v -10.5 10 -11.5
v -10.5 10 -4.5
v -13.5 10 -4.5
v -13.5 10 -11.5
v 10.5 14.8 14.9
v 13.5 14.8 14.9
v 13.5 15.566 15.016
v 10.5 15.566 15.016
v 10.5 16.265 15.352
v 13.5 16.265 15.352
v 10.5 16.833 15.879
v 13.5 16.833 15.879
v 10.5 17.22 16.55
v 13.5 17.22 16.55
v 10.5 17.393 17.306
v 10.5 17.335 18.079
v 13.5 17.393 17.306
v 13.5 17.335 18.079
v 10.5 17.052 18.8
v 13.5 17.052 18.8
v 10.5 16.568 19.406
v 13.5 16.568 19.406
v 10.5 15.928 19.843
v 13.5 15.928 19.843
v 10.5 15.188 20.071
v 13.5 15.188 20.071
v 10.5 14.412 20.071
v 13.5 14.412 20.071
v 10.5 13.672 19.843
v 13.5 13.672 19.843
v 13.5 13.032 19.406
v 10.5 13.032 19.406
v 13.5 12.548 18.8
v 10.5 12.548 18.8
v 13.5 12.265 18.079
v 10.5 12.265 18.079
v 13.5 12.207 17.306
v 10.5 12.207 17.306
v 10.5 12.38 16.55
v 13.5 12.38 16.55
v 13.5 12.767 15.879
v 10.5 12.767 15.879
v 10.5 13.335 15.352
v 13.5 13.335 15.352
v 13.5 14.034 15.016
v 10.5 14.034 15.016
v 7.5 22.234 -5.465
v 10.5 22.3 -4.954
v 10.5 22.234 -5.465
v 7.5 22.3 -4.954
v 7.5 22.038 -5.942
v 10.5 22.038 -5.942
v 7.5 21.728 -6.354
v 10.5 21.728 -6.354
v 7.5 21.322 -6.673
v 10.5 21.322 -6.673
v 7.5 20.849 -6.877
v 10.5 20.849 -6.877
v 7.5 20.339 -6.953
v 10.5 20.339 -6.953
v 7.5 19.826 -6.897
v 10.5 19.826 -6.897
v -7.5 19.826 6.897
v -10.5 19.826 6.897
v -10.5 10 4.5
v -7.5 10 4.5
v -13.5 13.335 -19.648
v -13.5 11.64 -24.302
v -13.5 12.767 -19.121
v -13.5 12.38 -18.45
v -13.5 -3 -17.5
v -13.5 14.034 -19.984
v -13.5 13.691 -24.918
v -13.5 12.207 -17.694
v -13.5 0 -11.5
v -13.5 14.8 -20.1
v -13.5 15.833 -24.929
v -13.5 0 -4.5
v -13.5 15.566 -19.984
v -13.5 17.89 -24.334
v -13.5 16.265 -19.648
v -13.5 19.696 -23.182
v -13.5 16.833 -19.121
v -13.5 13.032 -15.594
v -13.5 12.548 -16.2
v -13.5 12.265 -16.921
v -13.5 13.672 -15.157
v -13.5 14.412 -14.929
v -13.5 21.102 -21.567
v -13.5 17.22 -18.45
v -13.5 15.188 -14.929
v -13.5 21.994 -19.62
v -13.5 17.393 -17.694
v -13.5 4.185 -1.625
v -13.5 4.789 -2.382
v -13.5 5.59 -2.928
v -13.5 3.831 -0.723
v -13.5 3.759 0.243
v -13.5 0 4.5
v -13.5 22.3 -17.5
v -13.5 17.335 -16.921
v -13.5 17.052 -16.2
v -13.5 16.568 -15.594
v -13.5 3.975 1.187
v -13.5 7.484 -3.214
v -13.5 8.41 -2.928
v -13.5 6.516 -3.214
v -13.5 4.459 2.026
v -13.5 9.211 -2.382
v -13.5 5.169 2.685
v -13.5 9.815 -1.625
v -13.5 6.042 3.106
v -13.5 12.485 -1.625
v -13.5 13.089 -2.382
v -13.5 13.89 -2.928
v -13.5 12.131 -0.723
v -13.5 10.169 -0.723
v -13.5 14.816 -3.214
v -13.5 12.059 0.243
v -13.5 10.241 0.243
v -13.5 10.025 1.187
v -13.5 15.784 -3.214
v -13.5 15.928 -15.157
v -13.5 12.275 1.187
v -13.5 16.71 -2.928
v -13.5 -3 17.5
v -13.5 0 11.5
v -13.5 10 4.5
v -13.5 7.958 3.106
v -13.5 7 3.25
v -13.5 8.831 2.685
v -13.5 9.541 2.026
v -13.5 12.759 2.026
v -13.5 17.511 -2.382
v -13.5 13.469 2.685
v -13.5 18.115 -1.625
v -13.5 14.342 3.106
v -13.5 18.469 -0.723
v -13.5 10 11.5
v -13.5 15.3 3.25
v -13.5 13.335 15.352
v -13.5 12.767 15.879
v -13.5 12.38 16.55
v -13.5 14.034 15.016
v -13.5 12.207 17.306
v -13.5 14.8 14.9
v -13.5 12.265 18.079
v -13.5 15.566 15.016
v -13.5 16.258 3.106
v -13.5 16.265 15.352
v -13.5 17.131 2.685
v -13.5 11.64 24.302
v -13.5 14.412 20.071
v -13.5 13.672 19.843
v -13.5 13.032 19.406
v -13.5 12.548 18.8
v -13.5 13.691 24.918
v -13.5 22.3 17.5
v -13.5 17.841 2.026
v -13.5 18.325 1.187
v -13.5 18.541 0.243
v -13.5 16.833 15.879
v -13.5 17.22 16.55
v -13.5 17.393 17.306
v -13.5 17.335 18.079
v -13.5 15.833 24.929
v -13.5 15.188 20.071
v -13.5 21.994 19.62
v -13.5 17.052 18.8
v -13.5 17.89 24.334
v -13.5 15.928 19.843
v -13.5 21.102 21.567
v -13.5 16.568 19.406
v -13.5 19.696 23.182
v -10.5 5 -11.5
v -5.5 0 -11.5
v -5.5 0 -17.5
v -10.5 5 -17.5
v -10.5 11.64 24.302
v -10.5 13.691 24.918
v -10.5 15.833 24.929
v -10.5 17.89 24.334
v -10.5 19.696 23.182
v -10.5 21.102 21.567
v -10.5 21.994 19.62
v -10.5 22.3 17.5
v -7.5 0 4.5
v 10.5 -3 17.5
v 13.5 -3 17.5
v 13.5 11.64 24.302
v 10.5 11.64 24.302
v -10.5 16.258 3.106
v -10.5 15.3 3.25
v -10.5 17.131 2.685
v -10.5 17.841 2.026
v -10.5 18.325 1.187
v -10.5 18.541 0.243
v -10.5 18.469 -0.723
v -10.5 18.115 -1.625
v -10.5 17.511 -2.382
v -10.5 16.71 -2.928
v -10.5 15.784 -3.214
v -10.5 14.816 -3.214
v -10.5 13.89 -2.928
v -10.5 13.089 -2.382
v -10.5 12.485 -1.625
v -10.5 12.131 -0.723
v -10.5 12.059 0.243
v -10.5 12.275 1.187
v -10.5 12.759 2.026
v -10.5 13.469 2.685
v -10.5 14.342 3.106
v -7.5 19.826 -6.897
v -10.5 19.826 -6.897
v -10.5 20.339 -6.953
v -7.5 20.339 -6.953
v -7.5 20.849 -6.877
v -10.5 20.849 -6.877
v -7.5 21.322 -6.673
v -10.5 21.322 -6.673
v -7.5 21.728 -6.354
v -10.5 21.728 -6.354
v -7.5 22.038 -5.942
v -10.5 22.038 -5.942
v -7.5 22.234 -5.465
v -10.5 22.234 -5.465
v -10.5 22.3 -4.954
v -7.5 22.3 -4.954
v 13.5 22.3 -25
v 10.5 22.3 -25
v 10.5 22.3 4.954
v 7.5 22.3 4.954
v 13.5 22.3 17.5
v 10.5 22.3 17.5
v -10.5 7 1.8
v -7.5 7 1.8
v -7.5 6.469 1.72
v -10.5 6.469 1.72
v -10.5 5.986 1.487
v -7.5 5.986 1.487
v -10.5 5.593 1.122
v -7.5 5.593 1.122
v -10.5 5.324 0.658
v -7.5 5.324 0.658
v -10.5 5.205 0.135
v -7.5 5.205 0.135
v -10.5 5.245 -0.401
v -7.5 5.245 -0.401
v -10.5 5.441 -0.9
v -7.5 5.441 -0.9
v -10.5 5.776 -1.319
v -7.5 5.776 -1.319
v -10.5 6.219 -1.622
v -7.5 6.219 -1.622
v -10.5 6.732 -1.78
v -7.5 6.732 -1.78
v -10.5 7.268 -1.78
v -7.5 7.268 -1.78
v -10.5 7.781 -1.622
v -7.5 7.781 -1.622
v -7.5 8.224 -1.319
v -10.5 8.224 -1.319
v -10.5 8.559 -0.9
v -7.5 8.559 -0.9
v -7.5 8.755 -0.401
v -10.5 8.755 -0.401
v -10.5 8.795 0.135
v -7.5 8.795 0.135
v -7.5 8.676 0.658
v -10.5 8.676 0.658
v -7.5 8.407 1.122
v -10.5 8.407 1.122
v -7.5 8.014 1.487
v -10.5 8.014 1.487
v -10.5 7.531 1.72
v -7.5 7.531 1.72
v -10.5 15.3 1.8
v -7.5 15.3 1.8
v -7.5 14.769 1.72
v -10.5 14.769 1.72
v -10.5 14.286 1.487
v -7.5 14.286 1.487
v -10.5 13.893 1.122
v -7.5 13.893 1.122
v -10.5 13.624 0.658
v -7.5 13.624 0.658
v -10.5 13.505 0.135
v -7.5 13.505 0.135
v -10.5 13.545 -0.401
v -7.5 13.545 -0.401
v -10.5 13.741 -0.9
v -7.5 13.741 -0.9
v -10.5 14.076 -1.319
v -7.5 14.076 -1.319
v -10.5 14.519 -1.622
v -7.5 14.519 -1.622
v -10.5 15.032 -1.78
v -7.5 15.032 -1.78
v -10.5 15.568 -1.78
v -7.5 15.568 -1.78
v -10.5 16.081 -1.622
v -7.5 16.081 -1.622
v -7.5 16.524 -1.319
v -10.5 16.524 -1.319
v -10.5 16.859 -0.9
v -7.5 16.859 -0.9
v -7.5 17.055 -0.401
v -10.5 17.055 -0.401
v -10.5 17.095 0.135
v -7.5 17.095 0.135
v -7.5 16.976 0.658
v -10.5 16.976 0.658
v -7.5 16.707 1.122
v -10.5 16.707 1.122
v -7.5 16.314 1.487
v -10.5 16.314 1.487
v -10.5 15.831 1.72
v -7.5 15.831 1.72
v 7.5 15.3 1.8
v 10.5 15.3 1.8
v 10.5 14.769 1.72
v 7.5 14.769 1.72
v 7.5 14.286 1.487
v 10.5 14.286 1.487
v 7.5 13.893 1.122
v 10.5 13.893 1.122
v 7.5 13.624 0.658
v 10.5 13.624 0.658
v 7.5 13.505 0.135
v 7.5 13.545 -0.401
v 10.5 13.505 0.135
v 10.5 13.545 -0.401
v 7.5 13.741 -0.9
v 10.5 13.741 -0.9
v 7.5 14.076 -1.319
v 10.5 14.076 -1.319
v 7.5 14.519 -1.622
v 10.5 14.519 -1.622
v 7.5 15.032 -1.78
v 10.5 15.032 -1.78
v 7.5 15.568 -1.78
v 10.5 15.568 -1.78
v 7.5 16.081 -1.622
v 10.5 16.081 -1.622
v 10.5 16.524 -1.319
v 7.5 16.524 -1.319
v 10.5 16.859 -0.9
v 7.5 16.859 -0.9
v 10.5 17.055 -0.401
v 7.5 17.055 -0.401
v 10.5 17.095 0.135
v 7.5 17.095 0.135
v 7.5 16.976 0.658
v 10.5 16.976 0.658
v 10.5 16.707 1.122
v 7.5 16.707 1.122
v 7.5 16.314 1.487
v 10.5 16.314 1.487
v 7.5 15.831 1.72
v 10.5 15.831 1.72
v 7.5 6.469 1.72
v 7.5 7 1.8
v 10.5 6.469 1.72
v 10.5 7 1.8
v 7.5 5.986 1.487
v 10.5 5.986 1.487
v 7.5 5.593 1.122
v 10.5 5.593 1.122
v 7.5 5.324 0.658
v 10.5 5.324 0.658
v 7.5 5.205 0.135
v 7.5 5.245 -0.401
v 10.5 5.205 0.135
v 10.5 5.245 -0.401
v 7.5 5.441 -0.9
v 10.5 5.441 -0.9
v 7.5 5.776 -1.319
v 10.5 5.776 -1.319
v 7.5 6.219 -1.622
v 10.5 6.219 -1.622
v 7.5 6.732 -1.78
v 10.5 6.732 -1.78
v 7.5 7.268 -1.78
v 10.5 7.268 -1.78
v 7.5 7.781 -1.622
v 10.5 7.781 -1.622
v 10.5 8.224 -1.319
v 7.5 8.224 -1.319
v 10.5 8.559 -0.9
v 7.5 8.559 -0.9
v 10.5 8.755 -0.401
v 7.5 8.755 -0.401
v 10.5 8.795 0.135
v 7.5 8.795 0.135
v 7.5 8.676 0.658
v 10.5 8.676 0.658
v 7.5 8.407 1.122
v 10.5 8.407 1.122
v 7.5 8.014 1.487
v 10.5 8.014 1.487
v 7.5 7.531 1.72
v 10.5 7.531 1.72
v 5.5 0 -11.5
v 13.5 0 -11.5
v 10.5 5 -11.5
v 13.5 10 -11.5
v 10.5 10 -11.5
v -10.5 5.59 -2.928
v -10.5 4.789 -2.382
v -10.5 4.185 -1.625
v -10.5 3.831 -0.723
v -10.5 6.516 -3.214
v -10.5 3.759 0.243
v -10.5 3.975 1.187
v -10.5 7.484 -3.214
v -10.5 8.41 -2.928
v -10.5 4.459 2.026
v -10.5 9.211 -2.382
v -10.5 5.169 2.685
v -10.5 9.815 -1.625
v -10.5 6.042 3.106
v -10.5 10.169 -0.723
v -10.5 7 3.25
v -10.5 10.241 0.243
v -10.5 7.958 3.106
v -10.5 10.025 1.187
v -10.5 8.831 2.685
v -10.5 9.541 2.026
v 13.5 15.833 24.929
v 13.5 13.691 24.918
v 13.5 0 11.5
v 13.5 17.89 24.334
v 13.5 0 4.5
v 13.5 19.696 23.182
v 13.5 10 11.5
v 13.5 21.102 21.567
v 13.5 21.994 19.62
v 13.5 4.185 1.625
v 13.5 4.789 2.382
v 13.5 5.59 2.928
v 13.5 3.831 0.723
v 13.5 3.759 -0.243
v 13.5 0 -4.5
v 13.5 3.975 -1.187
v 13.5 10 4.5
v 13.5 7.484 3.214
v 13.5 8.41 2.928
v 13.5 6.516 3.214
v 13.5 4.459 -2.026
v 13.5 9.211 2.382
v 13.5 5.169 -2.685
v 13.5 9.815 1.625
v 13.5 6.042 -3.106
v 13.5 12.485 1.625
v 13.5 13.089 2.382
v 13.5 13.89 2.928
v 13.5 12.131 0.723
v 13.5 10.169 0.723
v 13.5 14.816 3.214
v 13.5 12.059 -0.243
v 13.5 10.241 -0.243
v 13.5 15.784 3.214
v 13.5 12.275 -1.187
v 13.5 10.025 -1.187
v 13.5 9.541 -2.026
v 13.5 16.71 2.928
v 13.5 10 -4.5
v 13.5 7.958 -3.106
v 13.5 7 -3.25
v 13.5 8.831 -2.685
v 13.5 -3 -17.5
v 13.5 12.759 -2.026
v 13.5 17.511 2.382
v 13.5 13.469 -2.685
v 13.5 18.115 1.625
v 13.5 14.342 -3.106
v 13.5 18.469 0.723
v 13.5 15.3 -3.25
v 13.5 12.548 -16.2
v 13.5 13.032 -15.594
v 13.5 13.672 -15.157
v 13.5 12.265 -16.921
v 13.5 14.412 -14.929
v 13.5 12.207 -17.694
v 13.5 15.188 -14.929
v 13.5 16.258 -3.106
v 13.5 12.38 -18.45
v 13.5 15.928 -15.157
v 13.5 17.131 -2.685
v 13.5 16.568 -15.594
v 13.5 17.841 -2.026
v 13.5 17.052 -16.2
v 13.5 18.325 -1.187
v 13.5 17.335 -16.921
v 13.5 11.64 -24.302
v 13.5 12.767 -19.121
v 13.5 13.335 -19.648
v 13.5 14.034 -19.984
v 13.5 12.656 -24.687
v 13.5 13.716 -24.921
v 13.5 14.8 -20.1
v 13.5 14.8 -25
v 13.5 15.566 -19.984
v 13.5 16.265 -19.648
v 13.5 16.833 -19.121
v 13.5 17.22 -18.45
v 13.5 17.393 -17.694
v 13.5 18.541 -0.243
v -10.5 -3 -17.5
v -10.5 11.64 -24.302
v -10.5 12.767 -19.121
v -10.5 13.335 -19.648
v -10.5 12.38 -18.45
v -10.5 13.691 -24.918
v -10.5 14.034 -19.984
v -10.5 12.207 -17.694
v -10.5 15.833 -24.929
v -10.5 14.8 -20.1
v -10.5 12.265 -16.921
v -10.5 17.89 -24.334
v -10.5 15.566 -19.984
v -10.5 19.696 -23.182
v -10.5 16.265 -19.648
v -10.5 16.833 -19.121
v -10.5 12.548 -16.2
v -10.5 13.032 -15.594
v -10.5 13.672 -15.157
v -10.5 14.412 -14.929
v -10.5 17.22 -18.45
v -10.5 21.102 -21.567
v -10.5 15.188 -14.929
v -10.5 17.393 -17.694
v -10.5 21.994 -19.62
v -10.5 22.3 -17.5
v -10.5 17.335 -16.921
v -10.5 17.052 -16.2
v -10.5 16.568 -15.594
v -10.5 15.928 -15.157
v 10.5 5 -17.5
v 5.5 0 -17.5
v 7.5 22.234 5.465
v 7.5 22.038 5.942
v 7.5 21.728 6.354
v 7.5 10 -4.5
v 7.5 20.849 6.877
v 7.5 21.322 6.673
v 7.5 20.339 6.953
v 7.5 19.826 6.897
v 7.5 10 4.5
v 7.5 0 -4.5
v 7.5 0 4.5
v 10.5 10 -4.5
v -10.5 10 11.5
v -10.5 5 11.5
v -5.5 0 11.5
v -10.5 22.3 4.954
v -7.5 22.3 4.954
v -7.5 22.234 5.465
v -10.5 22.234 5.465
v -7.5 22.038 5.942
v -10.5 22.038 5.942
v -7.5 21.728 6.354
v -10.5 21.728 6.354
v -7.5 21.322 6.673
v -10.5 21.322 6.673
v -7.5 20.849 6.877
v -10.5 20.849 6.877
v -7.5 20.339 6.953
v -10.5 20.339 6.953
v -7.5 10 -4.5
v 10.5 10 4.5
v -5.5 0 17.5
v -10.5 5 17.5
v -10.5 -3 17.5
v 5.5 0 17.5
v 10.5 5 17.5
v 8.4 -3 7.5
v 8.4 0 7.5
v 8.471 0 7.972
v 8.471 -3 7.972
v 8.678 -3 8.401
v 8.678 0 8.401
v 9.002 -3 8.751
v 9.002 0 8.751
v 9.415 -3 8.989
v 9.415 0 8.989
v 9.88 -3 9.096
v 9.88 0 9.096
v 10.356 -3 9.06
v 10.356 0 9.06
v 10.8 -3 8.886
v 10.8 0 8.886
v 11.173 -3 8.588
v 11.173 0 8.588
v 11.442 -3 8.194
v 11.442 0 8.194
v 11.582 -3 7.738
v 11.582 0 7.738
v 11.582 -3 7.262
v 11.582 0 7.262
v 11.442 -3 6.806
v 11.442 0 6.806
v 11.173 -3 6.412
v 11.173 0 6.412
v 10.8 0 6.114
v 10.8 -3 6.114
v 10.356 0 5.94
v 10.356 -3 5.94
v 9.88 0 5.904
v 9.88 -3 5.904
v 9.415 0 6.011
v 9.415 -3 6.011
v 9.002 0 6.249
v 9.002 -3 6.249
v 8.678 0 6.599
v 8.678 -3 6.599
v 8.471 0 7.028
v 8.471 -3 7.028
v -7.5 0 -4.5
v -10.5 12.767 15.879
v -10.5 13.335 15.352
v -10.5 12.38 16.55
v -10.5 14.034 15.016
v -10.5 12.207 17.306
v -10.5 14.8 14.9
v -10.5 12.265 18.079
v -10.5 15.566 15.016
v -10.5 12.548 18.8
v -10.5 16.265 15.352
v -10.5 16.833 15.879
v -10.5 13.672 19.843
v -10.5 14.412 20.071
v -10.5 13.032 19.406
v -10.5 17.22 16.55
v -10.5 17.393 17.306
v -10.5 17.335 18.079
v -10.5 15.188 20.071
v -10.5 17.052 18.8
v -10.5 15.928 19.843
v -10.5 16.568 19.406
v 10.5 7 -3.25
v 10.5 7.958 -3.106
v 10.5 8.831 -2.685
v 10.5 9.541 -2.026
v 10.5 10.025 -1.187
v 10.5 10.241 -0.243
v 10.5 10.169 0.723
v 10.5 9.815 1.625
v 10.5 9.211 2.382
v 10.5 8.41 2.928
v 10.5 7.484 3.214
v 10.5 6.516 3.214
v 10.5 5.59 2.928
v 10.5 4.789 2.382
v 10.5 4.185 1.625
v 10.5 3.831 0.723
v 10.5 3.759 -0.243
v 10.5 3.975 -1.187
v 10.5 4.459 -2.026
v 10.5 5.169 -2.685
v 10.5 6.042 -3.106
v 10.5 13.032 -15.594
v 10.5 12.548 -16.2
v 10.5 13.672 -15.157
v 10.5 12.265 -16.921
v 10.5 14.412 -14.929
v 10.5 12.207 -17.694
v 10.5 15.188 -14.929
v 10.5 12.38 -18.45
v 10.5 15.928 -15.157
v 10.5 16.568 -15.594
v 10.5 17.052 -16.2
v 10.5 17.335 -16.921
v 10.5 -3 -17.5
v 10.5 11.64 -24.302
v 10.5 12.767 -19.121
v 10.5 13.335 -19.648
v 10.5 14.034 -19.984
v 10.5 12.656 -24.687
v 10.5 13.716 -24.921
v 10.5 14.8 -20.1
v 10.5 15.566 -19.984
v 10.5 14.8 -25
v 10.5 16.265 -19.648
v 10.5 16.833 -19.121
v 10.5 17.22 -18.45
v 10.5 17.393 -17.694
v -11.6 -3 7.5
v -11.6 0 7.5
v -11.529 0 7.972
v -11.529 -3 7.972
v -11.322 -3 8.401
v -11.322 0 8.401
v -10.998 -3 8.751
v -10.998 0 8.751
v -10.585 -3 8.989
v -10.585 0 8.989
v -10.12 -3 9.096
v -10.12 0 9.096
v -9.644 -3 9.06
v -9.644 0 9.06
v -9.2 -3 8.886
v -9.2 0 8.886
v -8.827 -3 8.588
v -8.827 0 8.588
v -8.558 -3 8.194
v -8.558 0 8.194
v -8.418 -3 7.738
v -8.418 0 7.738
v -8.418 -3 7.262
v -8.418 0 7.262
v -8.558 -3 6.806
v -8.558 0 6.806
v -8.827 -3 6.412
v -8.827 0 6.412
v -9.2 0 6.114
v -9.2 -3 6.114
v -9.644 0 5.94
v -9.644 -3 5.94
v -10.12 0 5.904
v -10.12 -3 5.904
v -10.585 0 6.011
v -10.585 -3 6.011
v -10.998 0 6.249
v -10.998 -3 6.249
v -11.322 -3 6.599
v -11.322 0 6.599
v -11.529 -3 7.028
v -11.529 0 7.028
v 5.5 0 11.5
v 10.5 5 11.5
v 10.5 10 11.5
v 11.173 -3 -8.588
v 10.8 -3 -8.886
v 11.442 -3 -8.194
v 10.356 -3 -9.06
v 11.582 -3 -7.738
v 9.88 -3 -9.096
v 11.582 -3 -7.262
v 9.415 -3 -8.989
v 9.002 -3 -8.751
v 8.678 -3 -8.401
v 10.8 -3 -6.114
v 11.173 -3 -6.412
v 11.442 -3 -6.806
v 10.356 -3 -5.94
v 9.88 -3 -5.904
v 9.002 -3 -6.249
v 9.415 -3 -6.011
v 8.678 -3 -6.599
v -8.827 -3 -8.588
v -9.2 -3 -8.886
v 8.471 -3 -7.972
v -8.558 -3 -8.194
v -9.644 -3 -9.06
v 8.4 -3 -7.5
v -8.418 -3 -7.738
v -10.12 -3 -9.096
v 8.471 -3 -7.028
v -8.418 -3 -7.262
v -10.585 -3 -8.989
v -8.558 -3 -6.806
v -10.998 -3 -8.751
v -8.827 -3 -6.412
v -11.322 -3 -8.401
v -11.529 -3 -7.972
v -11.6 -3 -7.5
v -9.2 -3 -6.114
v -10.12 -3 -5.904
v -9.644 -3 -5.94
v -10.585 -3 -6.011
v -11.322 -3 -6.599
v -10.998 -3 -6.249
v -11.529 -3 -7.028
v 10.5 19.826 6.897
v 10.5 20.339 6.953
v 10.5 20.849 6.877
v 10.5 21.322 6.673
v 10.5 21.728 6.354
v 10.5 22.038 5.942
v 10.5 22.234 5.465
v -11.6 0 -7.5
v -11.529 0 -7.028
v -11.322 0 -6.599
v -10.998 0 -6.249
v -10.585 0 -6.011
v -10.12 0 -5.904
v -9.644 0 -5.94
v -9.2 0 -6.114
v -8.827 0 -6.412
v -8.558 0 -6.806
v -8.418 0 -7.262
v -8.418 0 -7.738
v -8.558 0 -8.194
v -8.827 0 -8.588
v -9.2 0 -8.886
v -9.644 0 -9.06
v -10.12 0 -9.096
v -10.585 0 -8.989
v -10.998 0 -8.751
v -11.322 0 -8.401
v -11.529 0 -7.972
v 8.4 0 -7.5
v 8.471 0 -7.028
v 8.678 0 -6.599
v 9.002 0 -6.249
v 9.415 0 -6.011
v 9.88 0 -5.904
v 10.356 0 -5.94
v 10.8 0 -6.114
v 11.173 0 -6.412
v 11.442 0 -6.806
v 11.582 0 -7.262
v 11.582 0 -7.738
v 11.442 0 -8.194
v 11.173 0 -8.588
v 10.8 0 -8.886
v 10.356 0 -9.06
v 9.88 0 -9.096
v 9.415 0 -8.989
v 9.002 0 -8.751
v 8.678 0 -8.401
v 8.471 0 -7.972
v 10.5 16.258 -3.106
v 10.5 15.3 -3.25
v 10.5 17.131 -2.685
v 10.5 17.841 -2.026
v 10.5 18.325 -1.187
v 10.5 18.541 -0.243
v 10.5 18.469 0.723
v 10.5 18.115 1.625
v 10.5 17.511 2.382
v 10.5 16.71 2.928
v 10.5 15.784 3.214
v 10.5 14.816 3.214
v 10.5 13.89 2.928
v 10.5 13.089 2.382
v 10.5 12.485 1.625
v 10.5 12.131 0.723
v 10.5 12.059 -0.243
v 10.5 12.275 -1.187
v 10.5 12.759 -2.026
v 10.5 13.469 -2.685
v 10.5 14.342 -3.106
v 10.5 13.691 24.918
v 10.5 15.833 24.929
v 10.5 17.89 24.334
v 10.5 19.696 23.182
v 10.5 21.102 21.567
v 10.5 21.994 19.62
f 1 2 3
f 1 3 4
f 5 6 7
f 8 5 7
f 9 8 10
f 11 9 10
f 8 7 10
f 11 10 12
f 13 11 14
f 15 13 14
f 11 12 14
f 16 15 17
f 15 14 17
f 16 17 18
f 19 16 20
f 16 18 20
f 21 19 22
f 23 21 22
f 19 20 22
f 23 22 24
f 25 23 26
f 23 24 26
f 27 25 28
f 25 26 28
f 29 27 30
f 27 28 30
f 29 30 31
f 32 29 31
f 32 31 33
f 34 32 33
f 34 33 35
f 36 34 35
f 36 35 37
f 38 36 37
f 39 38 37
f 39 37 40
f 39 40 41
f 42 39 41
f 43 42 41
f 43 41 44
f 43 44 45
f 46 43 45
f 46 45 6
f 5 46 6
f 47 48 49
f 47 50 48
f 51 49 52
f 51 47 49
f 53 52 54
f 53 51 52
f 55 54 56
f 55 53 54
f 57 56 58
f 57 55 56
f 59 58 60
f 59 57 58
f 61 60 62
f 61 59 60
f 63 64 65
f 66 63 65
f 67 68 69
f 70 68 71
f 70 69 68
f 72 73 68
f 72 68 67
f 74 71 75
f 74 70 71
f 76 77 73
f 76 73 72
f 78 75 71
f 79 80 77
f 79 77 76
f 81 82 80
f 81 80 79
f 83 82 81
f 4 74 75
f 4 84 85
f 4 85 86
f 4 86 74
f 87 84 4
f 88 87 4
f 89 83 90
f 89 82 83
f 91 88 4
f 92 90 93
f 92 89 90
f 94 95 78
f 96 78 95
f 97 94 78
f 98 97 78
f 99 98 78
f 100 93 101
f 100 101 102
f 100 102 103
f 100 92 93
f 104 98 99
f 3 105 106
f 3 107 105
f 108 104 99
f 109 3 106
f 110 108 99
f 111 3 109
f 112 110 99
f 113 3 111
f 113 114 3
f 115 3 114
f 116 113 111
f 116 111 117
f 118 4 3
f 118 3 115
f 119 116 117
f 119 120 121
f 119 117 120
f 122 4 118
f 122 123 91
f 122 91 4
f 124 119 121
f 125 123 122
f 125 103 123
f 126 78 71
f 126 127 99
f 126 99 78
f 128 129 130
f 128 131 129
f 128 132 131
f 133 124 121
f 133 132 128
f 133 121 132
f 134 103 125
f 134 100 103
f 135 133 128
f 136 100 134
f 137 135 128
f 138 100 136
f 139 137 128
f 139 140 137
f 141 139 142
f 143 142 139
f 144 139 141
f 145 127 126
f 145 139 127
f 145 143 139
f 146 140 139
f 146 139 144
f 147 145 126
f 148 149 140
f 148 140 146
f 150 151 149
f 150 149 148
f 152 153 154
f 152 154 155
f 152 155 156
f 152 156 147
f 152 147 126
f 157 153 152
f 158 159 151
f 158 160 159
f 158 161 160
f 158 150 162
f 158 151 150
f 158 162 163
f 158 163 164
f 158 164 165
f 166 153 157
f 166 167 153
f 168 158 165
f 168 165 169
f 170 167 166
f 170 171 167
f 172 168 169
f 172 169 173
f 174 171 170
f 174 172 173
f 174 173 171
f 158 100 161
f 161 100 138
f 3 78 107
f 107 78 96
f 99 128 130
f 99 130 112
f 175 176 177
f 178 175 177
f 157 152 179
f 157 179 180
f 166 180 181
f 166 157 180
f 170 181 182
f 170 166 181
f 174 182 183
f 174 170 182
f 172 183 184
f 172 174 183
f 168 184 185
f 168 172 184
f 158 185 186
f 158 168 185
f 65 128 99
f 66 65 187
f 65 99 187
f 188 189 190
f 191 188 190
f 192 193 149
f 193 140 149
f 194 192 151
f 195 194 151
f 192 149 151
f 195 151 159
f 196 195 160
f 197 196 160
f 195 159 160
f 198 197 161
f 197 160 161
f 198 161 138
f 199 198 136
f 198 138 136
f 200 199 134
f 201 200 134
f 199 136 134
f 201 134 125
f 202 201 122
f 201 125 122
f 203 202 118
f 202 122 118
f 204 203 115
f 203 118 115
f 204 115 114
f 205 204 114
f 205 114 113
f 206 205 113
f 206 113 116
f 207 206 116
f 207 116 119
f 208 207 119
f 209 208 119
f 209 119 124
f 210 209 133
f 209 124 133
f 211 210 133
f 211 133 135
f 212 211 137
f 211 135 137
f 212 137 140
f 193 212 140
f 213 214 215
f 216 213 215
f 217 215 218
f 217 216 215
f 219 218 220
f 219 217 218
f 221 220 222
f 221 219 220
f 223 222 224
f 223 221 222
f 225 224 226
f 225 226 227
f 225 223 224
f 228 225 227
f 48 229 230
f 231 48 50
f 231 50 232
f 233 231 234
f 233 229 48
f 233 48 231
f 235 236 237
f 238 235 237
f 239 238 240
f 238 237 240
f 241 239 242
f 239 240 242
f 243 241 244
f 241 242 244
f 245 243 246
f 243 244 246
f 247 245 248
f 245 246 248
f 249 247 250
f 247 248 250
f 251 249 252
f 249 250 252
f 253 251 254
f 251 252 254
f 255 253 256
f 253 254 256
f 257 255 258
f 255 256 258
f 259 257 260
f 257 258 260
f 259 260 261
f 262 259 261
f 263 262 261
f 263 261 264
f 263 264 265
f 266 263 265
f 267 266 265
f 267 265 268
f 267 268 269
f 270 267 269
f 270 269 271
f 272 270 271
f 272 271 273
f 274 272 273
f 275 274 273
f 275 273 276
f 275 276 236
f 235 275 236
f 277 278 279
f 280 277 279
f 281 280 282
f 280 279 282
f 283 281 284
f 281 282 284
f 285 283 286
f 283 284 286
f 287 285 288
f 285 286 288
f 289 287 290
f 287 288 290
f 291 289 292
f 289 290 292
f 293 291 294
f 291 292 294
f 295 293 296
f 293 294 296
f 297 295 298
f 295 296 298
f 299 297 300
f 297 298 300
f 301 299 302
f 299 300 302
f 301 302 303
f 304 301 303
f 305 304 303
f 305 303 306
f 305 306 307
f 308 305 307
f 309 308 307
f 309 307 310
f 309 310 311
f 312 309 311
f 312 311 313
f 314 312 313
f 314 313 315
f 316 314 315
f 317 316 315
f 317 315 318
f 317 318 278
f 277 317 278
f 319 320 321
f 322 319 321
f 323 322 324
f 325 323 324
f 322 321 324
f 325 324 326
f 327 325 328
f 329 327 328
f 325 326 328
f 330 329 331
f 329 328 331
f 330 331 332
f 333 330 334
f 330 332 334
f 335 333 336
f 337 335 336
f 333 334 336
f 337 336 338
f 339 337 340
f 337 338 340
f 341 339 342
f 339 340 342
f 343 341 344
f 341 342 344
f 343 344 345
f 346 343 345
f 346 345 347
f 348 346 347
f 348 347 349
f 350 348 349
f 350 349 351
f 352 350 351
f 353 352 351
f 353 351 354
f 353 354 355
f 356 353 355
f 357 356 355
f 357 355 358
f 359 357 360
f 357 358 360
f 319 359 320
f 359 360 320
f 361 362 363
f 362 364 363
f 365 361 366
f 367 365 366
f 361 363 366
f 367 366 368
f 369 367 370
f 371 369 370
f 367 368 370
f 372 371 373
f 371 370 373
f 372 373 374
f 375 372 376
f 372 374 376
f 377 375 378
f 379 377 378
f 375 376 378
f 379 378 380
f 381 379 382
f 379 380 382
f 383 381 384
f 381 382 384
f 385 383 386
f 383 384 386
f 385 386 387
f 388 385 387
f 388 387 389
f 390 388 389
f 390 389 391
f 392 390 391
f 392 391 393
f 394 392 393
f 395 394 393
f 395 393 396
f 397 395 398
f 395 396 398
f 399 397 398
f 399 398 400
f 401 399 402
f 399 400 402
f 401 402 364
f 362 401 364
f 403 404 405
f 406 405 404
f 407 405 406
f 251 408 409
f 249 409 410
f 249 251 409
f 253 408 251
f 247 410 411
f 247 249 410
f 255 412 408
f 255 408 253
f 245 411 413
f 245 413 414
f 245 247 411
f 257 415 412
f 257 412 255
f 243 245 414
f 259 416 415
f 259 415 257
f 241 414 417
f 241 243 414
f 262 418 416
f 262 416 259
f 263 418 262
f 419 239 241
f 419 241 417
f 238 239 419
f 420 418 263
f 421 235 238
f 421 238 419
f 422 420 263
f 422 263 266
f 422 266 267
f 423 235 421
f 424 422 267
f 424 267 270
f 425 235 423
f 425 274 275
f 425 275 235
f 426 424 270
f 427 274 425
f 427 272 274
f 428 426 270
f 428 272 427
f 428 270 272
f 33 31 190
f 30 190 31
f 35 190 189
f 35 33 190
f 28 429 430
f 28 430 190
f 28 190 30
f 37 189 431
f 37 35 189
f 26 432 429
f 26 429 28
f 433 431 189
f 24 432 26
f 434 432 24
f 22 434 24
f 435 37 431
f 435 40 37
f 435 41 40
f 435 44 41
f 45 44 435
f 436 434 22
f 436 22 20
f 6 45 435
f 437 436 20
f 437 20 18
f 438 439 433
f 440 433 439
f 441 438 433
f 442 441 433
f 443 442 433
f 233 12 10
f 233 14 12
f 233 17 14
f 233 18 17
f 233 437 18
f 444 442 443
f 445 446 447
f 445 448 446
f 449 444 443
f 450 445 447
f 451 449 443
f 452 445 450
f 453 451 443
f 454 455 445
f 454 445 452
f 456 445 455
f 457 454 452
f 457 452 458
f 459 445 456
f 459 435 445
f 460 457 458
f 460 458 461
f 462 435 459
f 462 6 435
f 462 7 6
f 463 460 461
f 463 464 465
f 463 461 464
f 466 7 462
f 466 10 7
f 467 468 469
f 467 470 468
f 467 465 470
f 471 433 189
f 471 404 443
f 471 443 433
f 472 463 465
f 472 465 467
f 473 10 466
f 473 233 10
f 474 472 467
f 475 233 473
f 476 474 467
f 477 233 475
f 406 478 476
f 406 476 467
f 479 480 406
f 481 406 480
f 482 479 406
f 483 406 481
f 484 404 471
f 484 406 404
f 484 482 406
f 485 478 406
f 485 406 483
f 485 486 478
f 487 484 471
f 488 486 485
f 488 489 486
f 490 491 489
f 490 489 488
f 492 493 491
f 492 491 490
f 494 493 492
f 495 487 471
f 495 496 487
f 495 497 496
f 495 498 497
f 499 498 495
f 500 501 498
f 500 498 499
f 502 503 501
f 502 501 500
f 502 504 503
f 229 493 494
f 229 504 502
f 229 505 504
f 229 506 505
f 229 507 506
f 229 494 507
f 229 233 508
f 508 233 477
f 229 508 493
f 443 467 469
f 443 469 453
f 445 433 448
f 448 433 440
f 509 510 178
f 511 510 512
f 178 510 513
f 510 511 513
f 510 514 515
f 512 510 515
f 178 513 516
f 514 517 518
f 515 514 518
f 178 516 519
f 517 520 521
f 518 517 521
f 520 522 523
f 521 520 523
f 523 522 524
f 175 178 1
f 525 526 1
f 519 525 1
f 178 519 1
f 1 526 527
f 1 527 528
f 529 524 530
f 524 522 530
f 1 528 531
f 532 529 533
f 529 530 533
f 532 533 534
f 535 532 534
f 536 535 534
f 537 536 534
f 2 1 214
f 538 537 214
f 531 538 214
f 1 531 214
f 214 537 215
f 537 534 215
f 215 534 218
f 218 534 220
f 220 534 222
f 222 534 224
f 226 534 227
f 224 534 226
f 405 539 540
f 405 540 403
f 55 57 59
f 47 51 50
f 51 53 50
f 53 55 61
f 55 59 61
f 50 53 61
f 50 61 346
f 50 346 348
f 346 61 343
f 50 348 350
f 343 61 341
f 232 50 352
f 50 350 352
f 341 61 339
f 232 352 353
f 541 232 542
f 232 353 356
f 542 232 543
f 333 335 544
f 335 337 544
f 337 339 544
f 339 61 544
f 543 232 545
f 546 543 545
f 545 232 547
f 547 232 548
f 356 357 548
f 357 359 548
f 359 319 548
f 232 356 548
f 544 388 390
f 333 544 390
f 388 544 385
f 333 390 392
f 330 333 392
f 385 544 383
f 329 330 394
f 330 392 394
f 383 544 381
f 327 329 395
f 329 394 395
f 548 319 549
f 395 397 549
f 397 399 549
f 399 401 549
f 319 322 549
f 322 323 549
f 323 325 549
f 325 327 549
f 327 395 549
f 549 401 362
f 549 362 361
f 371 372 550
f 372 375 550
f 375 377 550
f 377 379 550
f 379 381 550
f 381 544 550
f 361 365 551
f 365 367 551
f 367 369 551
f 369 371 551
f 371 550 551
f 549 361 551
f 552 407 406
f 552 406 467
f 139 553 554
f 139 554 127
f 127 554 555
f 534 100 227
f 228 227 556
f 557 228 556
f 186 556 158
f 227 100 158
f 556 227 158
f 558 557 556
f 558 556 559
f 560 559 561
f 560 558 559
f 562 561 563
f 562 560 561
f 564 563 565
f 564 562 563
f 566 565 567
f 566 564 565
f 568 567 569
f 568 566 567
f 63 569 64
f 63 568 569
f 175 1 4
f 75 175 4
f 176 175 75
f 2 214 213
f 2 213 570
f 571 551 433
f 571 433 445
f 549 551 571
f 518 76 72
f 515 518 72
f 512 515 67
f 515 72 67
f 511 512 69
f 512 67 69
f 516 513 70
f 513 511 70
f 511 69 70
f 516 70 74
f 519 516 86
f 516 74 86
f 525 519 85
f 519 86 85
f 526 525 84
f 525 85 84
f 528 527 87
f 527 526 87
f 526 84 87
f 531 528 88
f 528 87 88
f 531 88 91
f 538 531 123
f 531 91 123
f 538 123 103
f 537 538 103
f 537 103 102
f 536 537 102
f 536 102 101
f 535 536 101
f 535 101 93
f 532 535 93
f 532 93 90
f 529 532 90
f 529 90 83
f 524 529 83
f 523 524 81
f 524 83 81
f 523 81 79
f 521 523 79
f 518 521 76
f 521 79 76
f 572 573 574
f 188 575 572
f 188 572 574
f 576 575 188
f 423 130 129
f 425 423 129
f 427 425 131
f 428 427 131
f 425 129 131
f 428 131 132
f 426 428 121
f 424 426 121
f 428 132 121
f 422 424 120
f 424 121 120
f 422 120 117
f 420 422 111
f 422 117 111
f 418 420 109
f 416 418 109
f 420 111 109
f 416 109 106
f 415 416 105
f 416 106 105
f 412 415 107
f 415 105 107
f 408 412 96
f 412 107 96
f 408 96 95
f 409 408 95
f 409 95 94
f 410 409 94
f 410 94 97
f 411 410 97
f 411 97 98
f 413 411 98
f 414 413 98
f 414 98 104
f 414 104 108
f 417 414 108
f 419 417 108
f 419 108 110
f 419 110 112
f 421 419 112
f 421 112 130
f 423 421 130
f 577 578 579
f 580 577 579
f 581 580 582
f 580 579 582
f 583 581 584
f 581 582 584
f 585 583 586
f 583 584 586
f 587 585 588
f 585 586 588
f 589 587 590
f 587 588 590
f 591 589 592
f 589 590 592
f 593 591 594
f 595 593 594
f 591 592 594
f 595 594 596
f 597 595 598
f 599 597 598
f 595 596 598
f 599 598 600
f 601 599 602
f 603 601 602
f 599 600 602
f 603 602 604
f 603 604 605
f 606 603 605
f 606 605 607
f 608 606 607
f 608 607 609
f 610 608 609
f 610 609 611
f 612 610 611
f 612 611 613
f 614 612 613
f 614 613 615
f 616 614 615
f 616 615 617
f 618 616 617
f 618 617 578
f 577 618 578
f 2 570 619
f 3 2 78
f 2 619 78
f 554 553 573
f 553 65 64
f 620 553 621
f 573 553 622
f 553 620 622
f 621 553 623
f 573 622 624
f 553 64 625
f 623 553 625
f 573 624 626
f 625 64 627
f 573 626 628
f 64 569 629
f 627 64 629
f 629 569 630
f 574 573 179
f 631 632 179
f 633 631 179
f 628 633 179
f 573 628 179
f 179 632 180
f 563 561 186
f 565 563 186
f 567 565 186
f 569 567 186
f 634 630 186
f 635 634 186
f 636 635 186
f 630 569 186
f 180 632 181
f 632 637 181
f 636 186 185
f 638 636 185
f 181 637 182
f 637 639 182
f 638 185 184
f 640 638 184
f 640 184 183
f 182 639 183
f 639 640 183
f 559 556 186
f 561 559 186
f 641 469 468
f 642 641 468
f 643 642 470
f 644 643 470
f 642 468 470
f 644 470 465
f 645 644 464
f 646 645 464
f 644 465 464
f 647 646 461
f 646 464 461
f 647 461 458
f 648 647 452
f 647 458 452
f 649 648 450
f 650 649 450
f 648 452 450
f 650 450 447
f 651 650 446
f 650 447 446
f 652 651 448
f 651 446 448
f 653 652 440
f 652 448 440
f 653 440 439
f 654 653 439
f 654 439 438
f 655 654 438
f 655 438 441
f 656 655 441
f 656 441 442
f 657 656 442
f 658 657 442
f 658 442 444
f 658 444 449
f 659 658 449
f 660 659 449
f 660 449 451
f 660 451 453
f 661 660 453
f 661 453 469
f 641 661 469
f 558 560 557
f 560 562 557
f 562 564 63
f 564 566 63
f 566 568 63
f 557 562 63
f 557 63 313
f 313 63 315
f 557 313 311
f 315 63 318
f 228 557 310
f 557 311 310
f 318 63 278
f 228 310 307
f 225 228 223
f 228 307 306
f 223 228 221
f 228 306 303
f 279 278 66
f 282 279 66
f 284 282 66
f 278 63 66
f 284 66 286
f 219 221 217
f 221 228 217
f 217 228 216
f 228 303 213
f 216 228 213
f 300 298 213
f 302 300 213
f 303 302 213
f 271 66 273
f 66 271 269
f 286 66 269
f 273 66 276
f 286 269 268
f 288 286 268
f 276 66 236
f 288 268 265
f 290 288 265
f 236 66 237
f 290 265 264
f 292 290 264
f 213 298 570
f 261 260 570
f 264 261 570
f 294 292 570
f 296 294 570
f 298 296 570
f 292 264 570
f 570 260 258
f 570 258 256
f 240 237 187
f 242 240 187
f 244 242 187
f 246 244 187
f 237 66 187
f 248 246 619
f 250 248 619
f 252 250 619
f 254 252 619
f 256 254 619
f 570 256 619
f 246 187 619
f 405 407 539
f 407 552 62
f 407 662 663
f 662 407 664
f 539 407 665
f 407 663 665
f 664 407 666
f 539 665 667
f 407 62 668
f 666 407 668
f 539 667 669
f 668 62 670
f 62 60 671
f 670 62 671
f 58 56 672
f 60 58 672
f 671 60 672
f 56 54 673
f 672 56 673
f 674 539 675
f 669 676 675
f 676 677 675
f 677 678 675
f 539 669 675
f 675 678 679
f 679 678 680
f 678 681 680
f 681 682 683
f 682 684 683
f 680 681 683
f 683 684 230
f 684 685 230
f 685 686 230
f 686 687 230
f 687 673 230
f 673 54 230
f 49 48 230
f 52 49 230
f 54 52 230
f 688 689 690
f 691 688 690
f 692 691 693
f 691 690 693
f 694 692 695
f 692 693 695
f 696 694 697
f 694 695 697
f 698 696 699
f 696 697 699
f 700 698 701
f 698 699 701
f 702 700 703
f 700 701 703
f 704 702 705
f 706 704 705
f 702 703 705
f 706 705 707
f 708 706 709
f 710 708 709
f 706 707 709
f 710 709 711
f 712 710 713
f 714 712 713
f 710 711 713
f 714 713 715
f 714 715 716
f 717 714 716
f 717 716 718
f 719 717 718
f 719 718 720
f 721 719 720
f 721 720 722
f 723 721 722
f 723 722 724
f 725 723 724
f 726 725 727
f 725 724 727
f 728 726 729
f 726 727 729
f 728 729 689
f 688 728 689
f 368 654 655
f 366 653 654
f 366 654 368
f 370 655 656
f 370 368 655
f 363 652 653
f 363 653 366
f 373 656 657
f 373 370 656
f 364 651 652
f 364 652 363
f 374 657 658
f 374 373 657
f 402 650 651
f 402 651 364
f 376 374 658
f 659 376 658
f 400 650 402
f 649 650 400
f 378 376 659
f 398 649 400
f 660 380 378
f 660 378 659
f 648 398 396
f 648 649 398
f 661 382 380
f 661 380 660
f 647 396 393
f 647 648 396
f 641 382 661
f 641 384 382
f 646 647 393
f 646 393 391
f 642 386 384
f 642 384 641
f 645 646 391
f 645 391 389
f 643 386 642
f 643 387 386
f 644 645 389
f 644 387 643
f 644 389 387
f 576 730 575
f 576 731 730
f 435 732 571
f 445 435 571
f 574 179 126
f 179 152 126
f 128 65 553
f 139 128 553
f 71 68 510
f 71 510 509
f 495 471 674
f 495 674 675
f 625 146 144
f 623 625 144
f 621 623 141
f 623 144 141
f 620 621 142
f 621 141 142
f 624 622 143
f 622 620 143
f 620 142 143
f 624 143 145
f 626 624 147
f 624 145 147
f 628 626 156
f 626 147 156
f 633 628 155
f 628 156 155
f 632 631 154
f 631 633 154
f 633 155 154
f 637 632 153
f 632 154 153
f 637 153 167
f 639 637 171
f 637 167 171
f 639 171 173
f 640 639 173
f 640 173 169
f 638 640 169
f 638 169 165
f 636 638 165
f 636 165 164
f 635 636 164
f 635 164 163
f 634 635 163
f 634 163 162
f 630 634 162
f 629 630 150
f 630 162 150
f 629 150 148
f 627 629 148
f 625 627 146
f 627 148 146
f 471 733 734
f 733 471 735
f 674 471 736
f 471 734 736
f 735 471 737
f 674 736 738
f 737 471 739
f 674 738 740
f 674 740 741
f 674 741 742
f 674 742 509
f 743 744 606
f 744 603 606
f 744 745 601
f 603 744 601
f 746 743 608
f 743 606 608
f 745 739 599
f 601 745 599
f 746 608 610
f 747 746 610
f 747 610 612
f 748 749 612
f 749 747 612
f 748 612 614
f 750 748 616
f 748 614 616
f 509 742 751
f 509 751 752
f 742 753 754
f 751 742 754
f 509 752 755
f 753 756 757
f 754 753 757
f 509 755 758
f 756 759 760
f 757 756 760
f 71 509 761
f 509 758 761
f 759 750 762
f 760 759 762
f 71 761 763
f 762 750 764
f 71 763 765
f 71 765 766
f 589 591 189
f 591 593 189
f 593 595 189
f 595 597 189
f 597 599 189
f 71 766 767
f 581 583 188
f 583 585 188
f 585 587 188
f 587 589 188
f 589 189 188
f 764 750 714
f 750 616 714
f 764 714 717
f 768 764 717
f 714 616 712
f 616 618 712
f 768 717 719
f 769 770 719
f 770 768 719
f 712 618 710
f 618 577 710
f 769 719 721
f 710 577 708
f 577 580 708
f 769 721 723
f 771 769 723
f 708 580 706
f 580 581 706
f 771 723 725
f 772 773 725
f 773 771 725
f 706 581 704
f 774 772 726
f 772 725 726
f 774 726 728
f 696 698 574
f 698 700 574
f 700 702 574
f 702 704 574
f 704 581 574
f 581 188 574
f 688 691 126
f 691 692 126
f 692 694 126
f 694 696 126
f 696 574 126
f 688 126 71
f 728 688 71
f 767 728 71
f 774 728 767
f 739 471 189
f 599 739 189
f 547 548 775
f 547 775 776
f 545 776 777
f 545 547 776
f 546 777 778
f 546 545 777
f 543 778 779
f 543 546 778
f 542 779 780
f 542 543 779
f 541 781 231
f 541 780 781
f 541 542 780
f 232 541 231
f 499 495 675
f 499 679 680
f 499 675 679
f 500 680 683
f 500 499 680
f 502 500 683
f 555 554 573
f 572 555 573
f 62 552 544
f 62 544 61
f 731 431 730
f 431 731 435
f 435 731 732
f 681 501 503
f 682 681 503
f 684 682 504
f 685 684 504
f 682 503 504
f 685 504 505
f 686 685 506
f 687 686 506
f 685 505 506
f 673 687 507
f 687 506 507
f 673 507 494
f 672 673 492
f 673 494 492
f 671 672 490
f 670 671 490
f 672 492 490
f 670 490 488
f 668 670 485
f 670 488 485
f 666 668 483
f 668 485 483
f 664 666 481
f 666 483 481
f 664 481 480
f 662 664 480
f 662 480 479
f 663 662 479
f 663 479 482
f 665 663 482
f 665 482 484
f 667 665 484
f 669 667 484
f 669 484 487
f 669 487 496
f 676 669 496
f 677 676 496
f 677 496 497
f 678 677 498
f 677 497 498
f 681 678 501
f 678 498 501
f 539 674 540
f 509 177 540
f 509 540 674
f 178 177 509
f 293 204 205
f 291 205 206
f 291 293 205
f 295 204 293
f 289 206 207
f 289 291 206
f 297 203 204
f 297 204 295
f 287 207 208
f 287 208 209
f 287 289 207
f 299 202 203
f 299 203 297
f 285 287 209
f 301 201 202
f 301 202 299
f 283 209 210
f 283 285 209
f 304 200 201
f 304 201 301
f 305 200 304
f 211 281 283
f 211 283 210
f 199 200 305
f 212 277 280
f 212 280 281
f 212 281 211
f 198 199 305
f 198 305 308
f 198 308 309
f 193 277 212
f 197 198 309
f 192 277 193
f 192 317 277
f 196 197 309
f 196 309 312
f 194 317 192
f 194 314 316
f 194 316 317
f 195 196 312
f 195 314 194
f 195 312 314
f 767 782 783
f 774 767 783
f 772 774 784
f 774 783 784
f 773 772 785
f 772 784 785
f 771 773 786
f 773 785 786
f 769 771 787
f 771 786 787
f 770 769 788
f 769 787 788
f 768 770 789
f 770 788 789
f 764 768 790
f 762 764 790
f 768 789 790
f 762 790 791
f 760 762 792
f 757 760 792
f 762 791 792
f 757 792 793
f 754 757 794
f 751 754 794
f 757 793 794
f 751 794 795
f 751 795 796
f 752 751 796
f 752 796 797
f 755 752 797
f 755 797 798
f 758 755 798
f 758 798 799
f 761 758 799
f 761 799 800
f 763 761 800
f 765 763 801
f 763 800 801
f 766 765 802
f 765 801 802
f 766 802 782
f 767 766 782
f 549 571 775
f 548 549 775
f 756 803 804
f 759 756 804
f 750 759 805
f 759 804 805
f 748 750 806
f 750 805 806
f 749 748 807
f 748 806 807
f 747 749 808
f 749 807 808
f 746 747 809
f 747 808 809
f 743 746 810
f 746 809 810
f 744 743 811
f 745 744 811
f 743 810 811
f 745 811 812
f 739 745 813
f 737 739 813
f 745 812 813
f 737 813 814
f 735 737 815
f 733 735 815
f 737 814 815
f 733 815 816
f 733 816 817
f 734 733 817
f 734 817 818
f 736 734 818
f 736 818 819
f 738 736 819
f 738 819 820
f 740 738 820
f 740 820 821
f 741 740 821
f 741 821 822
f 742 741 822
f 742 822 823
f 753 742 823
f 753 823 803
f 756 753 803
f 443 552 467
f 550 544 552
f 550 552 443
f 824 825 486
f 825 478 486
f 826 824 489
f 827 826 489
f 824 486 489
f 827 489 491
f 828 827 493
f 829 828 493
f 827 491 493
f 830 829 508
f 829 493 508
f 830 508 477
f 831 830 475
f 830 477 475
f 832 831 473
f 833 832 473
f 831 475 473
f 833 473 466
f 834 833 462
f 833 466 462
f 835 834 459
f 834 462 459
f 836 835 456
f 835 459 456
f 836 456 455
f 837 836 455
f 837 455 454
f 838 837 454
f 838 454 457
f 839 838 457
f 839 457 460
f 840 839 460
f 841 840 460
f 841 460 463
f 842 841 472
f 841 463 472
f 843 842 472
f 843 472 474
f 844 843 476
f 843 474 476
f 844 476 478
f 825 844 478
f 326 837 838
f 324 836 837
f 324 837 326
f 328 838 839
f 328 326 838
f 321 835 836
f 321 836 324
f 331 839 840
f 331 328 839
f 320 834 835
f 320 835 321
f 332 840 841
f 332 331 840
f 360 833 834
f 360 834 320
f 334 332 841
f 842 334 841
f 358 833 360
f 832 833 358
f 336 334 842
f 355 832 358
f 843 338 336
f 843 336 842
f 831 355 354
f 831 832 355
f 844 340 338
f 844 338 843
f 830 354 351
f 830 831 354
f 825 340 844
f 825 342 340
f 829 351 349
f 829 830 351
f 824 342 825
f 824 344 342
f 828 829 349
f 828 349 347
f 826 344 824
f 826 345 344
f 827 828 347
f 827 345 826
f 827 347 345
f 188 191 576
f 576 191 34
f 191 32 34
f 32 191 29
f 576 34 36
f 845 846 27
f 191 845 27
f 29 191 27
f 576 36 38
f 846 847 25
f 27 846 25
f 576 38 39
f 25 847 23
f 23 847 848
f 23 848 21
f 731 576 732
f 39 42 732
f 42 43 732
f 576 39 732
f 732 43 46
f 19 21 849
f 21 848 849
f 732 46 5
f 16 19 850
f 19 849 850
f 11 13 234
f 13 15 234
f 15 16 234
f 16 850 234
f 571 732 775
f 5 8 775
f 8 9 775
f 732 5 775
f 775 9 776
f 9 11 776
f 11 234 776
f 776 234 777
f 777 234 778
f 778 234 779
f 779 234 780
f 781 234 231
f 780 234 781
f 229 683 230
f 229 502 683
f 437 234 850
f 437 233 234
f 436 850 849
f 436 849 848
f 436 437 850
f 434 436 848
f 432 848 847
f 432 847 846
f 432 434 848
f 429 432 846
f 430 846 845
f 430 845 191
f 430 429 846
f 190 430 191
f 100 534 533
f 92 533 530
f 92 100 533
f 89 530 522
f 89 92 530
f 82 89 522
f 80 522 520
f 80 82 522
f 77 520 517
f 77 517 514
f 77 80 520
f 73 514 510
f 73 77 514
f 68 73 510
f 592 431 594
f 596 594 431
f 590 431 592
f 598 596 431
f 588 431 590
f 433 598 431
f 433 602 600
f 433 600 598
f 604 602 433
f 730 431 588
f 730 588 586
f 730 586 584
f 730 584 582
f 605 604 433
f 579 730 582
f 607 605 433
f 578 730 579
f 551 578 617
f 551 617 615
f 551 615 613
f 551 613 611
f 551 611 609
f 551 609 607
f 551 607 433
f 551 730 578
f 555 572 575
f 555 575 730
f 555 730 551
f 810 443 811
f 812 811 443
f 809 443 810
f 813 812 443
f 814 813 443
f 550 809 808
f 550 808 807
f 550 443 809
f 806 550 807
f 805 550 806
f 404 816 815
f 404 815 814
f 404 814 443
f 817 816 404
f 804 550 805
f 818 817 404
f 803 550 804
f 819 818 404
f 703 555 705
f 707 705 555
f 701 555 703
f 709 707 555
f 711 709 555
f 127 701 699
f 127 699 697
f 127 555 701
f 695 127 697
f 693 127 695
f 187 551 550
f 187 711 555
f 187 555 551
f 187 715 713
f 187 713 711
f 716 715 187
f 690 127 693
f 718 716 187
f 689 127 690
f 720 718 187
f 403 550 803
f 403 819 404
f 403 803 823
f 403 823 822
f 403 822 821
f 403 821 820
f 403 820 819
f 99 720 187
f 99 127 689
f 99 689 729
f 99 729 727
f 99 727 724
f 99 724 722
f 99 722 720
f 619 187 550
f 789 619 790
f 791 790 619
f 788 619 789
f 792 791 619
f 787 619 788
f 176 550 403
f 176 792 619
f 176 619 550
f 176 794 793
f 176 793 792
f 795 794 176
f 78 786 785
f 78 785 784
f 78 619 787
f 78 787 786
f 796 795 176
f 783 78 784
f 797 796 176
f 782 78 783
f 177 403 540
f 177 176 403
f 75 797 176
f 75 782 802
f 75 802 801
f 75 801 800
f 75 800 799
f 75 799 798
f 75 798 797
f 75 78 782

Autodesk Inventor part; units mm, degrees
ref_plane "YZ Plane" through (0, 0, 0) normal (1, 0, 0) x (0, 1, 0)
ref_plane "XZ Plane" through (0, 0, 0) normal (0, 1, 0) x (-1, 0, 0)
ref_plane "XY Plane" through (0, 0, 0) normal (0, 0, 1) x (1, 0, 0)
sketch "Sketch8" plane through (0, 0, 0) normal (0, 1, 0) x (-1, 0, 0)
  line L0 (-13.5, -17.5) -> (13.5, -17.5)
  line L1 (13.5, -17.5) -> (13.5, 17.5)
  line L2 (13.5, 17.5) -> (-13.5, 17.5)
  line L3 (-13.5, 17.5) -> (-13.5, -17.5)
  line L4 (-13.5, -17.5) -> (13.5, 17.5) construction
  line L5 (13.5, -17.5) -> (-13.5, 17.5) construction
  circle A0 centre (10, -7.5) radius 1.6
  circle A1 centre (10, 7.5) radius 1.6
  circle A2 centre (-10, 7.5) radius 1.6
  circle A3 centre (-10, -7.5) radius 1.6
  point P0 (0, 0)
  dimension "d38" = 35
  dimension "d39" = 27
  dimension "d40" = 20
  dimension "d41" = 15
  dimension "d42" = 7.5
  dimension "d43" = 10
  dimension "d44" = 3.2
extrude "Extrusion7" add sketch "Sketch8" against normal blind 3
sketch "Sketch14" plane through (0, 0, 0) normal (0, 1, 0) x (1, 0, 0)
  line L0 (-13.5, 17.5) -> (-13.5, -17.5) projected
  line L1 (-13.5, -17.5) -> (13.5, -17.5) projected
  line L2 (13.5, -17.5) -> (13.5, 17.5) projected
  line L3 (13.5, 17.5) -> (-13.5, 17.5) projected
  circle A0 centre (-10, 7.5) radius 1.6 projected
  circle A1 centre (-10, -7.5) radius 1.6 projected
  circle A2 centre (10, -7.5) radius 1.6 projected
  circle A3 centre (10, 7.5) radius 1.6 projected
  line L4 (13.5, -17.5) -> (13.5, 17.5) projected
  line L5 (13.5, 4.5) -> (7.5, 4.5)
  line L6 (7.5, 4.5) -> (7.5, -4.5)
  line L7 (7.5, -4.5) -> (13.5, -4.5)
  line L8 (13.5, -4.5) -> (13.5, 4.5)
  point P0 (0, 0)
  dimension "d79" = 7.5
  dimension "d80" = 3
  dimension "d81" = 3
extrude "Extrusion12" add sketch "Sketch14" along normal blind 22.3 contours L2 L7 L6 L5
sketch "Sketch15" plane through (13.5, -3, 17.5) normal (1, 0, 0) x (0, 0, -1)
  line L0 (0, 3) -> (13, 3) projected
  line L1 (0, 3) -> (0, 0) projected
  line L2 (35, 0) -> (0, 0) projected
  line L3 (35, 3) -> (35, 0) projected
  line L4 (22, 3) -> (35, 3) projected
  line L5 (22, 3) -> (22, 25.3) projected
  line L6 (13, 25.3) -> (22, 25.3) projected
  line L7 (13, 3) -> (13, 25.3) projected
  line L8 (35, 3) -> (35, 0) projected
  line L9 (35, 0) -> (41.8017, 14.6399)
  circle A0 centre (35, 17.8) radius 2.6
  circle A1 centre (35, 17.8) radius 7.5
  circle A2 centre (0, 17.8) radius 2.6
  circle A3 centre (0, 17.8) radius 7.5
  line L10 (-275, -9) -> (225, -9) projected
  line L11 (0, 0) -> (-6.8017, 14.6399)
  line L12 (0, 25.3) -> (35, 25.3)
  point P0 (17.5, 3)
  point P1 (13, 25.3)
  point P2 (22, 25.3)
  dimension "d84" = 5.2
  dimension "d85" = 35
  dimension "d86" = 17.5
  dimension "d87" = 26.8
  dimension "d88" = 15
extrude "Extrusion13" add sketch "Sketch15" against normal blind 3 contours L1 L11 A3 L12 L7 L0 | L3 L4 L5 L12 A1 L9 | A3 | A1
sketch "Sketch16" plane through (10.5, -3, 17.5) normal (-1, 0, 0) x (0, 0, 1)
  arc A0 (-35, 25.3) -> (-41.8017, 14.6399) centre (-35, 17.8) ccw projected
  line L0 (-41.8017, 14.6399) -> (-35, 0) projected
  line L1 (-35, 3) -> (-35, 0) projected
  line L2 (-26.5199, 3) -> (-35, 3) projected
  line L3 (-26.5199, 3) -> (-23.4801, 3) projected
  line L4 (-22, 3) -> (-23.4801, 3) projected
  line L5 (-22, 25.3) -> (-22, 3) projected
  line L6 (-22, 25.3) -> (-35, 25.3) projected
  circle A1 centre (-35, 17.8) radius 2.6 projected
  arc A2 (6.8017, 14.6399) -> (0, 25.3) centre (0, 17.8) ccw projected
  line L7 (0, 25.3) -> (-13, 25.3) projected
  line L8 (-13, 3) -> (-13, 25.3) projected
  line L9 (-11.5199, 3) -> (-13, 3) projected
  line L10 (-11.5199, 3) -> (-8.4801, 3) projected
  line L11 (0, 3) -> (-8.4801, 3) projected
  line L12 (0, 0) -> (0, 3) projected
  line L13 (0, 0) -> (6.8017, 14.6399) projected
  circle A3 centre (0, 17.8) radius 2.6 projected
  line L14 (-22, 3) -> (-29, 3)
  line L15 (-29, 3) -> (-29, 13)
  line L16 (-29, 13) -> (-22, 13)
  line L17 (-22, 13) -> (-22, 3)
  line L18 (-11.5199, 3) -> (-13, 3) projected
  line L19 (-13, 3) -> (-6, 3)
  line L20 (-6, 3) -> (-6, 13)
  line L21 (-6, 13) -> (-13, 13)
  line L22 (-13, 13) -> (-13, 3)
  line L23 (-23.4, 0) -> (-26.6, 0) projected
  line L24 (-26.6, 3) -> (-23.4, 3) projected
  line L25 (-8.4, 0) -> (-11.6, 0) projected
  line L26 (-11.6, 3) -> (-8.4, 3) projected
  point P0 (-17.5, 3)
  point P1 (-10, 0)
  point P2 (-6, 3)
  dimension "d91" = 7
  dimension "d92" = 3
  dimension "d93" = 10
extrude "Extrusion14" cut sketch "Sketch16" against normal blind 22.3 contours L5 L4 L3 L2 L15 L16 | L21 L20 L11 L10 L9 L8
sketch "Sketch17" plane through (10.5, -3, 17.5) normal (-1, 0, 0) x (0, 0, 1)
  circle A0 centre (-35, 17.8) radius 2.6 projected
  line L0 (-29, 3) -> (-29, 13) projected
  line L1 (-29, 13) -> (-22, 13) projected
  line L2 (-22, 25.3) -> (-22, 13) projected
  line L3 (-22, 25.3) -> (-35, 25.3) projected
  arc A1 (-35, 25.3) -> (-41.8017, 14.6399) centre (-35, 17.8) ccw projected
  line L4 (-41.8017, 14.6399) -> (-35, 0) projected
  line L5 (-35, 3) -> (-35, 0) projected
  line L6 (-29, 3) -> (-35, 3) projected
  circle A2 centre (0, 17.8) radius 2.6 projected
  line L7 (-13, 13) -> (-6, 13) projected
  line L8 (-6, 13) -> (-6, 3) projected
  line L9 (0, 3) -> (-6, 3) projected
  line L10 (0, 0) -> (0, 3) projected
  line L11 (0, 0) -> (6.8017, 14.6399) projected
  arc A3 (6.8017, 14.6399) -> (0, 25.3) centre (0, 17.8) ccw projected
  line L12 (0, 25.3) -> (-13, 25.3) projected
  line L13 (-13, 13) -> (-13, 25.3) projected
  line L14 (-13, 13) -> (-10, 25.3)
  line L15 (-22, 13) -> (-25, 25.3)
  line L16 (-35, 25.3) -> (0, 25.3) projected
  point P0 (-17.5, 3)
  dimension "d96" = 15
extrude "Extrusion15" add sketch "Sketch17" along normal up to surface (3 mm away) contours L12 L14 L13 | L15 L3 L2
fillet "Fillet2" radius 2 2 edges at (9, 22.3, -7.5) (9, 22.3, 7.5)
mirror "Mirror1" about plane through (0, 0, 0) normal (1, 0, 0) of "Extrusion12", "Extrusion13", "Extrusion14", "Extrusion15", "Fillet2"
chamfer "Chamfer1" distance 5 angle 45 4 edges at (-10.5, 0, 14.5) (-10.5, 0, -14.5) (10.5, 0, 14.5) (10.5, 0, -14.5)
sketch "Sketch18" plane through (-13.5, 22.3, -17.5) normal (-1, 0, 0) x (0, 0, 1)
  line L0 (13, -22.3) -> (6, -22.3) projected
  line L1 (6, -22.3) -> (6, -12.3) projected
  line L2 (6, -12.3) -> (13, -12.3) projected
  line L3 (13, -12.3) -> (13, -22.3) projected
  line L4 (29, -22.3) -> (22, -22.3) projected
  line L5 (22, -22.3) -> (22, -12.3) projected
  line L6 (22, -12.3) -> (29, -12.3) projected
  line L7 (29, -12.3) -> (29, -22.3) projected
  circle A0 centre (0, -7.5) radius 2.6 projected
  circle A1 centre (35, -7.5) radius 2.6 projected
  line L8 (41.8017, -10.6601) -> (35, -25.3) projected
  arc A2 (41.8017, -10.6601) -> (35, 0) centre (35, -7.5) ccw projected
  line L9 (0, 0) -> (35, 0) projected
  arc A3 (0, 0) -> (-6.8017, -10.6601) centre (0, -7.5) ccw projected
  line L10 (0, -25.3) -> (-6.8017, -10.6601) projected
  line L11 (35, -25.3) -> (0, -25.3) projected
  point P0 (17.5, -22.3)
  point P1 (17.5, -7)
  point P2 (17.5, -15.3)
  dimension "d103" = 7
  dimension "d104" = 10
hole "Hole3" at (-13.5, 15.3, 0) at (-13.5, 7, 0) direction (1, 0, 0) diameter 3.6 end through all clearance for "Slotted Cheese Head Screw ISO 1207" size "M3" standard "ISO"
sketch "Sketch19" plane through (13.5, 22.3, 17.5) normal (1, 0, 0) x (0, 0, -1)
  circle A0 centre (17.5, -15.3) radius 1.8 projected
  circle A1 centre (17.5, -7) radius 1.8 projected
  circle A2 centre (17.5, -15.3) radius 3.25
  circle A3 centre (17.5, -7) radius 3.25
  point P0 (17.5, -22.3)
  dimension "d112" = 6.5
extrude "Extrusion16" cut sketch "Sketch19" against normal blind 3 contours A0 | A1 | A2 | A3
sketch "Sketch20" plane through (-13.5, 22.3, -17.5) normal (-1, 0, 0) x (0, 0, 1)
  circle A0 centre (17.5, -15.3) radius 3.25 projected
  circle A1 centre (17.5, -7) radius 3.25 projected
  point P0 (17.5, -22.3)
extrude "Extrusion17" cut sketch "Sketch20" against normal blind 3
sketch "Sketch21" plane through (13.5, 22.3, 17.5) normal (1, 0, 0) x (0, 0, -1)
  circle A0 centre (17.5, -7) radius 3.25 projected
  circle A1 centre (17.5, -15.3) radius 3.25 projected
  line L0 (29, -22.3) -> (22, -22.3) projected
  line L1 (22, -22.3) -> (22, -12.3) projected
  line L2 (22, -12.3) -> (29, -12.3) projected
  line L3 (29, -12.3) -> (29, -22.3) projected
  line L4 (13, -22.3) -> (6, -22.3) projected
  line L5 (6, -22.3) -> (6, -12.3) projected
  line L6 (6, -12.3) -> (13, -12.3) projected
  line L7 (13, -12.3) -> (13, -22.3) projected
  circle A2 centre (0, -7.5) radius 2.6 projected
  circle A3 centre (35, -7.5) radius 2.6 projected
  line L8 (35, -25.3) -> (0, -25.3) projected
  line L9 (35, -25.3) -> (41.8017, -10.6601) projected
  arc A4 (41.8017, -10.6601) -> (35, 0) centre (35, -7.5) ccw projected
  line L10 (35, 0) -> (0, 0) projected
  arc A5 (0, 0) -> (-6.8017, -10.6601) centre (0, -7.5) ccw projected
  line L11 (-6.8017, -10.6601) -> (0, -25.3) projected
  arc A6 (41.8017, -10.6601) -> (35, 0) centre (35, -7.5) ccw projected
  line L12 (42.5, -7.5) -> (42.5, 0)
  line L13 (42.5, 0) -> (35, 0)
  line L14 (22.4536, 0) -> (35, 0) projected
  point P0 (17.5, -22.3)
extrude "Extrusion18" add sketch "Sketch21" against normal up to surface (3 mm away) contours A4 L13 L12
equation "\"d42\" = 0.5 * d41"
equation "\"d43\" = 0.5 * d40"
equation "\"d81\" = d80"
equation "\"d86\" = 0.5 * d85"
properties part number "Y Axis Gantry Baseblock (CNC)" material "ABS Plastic"
